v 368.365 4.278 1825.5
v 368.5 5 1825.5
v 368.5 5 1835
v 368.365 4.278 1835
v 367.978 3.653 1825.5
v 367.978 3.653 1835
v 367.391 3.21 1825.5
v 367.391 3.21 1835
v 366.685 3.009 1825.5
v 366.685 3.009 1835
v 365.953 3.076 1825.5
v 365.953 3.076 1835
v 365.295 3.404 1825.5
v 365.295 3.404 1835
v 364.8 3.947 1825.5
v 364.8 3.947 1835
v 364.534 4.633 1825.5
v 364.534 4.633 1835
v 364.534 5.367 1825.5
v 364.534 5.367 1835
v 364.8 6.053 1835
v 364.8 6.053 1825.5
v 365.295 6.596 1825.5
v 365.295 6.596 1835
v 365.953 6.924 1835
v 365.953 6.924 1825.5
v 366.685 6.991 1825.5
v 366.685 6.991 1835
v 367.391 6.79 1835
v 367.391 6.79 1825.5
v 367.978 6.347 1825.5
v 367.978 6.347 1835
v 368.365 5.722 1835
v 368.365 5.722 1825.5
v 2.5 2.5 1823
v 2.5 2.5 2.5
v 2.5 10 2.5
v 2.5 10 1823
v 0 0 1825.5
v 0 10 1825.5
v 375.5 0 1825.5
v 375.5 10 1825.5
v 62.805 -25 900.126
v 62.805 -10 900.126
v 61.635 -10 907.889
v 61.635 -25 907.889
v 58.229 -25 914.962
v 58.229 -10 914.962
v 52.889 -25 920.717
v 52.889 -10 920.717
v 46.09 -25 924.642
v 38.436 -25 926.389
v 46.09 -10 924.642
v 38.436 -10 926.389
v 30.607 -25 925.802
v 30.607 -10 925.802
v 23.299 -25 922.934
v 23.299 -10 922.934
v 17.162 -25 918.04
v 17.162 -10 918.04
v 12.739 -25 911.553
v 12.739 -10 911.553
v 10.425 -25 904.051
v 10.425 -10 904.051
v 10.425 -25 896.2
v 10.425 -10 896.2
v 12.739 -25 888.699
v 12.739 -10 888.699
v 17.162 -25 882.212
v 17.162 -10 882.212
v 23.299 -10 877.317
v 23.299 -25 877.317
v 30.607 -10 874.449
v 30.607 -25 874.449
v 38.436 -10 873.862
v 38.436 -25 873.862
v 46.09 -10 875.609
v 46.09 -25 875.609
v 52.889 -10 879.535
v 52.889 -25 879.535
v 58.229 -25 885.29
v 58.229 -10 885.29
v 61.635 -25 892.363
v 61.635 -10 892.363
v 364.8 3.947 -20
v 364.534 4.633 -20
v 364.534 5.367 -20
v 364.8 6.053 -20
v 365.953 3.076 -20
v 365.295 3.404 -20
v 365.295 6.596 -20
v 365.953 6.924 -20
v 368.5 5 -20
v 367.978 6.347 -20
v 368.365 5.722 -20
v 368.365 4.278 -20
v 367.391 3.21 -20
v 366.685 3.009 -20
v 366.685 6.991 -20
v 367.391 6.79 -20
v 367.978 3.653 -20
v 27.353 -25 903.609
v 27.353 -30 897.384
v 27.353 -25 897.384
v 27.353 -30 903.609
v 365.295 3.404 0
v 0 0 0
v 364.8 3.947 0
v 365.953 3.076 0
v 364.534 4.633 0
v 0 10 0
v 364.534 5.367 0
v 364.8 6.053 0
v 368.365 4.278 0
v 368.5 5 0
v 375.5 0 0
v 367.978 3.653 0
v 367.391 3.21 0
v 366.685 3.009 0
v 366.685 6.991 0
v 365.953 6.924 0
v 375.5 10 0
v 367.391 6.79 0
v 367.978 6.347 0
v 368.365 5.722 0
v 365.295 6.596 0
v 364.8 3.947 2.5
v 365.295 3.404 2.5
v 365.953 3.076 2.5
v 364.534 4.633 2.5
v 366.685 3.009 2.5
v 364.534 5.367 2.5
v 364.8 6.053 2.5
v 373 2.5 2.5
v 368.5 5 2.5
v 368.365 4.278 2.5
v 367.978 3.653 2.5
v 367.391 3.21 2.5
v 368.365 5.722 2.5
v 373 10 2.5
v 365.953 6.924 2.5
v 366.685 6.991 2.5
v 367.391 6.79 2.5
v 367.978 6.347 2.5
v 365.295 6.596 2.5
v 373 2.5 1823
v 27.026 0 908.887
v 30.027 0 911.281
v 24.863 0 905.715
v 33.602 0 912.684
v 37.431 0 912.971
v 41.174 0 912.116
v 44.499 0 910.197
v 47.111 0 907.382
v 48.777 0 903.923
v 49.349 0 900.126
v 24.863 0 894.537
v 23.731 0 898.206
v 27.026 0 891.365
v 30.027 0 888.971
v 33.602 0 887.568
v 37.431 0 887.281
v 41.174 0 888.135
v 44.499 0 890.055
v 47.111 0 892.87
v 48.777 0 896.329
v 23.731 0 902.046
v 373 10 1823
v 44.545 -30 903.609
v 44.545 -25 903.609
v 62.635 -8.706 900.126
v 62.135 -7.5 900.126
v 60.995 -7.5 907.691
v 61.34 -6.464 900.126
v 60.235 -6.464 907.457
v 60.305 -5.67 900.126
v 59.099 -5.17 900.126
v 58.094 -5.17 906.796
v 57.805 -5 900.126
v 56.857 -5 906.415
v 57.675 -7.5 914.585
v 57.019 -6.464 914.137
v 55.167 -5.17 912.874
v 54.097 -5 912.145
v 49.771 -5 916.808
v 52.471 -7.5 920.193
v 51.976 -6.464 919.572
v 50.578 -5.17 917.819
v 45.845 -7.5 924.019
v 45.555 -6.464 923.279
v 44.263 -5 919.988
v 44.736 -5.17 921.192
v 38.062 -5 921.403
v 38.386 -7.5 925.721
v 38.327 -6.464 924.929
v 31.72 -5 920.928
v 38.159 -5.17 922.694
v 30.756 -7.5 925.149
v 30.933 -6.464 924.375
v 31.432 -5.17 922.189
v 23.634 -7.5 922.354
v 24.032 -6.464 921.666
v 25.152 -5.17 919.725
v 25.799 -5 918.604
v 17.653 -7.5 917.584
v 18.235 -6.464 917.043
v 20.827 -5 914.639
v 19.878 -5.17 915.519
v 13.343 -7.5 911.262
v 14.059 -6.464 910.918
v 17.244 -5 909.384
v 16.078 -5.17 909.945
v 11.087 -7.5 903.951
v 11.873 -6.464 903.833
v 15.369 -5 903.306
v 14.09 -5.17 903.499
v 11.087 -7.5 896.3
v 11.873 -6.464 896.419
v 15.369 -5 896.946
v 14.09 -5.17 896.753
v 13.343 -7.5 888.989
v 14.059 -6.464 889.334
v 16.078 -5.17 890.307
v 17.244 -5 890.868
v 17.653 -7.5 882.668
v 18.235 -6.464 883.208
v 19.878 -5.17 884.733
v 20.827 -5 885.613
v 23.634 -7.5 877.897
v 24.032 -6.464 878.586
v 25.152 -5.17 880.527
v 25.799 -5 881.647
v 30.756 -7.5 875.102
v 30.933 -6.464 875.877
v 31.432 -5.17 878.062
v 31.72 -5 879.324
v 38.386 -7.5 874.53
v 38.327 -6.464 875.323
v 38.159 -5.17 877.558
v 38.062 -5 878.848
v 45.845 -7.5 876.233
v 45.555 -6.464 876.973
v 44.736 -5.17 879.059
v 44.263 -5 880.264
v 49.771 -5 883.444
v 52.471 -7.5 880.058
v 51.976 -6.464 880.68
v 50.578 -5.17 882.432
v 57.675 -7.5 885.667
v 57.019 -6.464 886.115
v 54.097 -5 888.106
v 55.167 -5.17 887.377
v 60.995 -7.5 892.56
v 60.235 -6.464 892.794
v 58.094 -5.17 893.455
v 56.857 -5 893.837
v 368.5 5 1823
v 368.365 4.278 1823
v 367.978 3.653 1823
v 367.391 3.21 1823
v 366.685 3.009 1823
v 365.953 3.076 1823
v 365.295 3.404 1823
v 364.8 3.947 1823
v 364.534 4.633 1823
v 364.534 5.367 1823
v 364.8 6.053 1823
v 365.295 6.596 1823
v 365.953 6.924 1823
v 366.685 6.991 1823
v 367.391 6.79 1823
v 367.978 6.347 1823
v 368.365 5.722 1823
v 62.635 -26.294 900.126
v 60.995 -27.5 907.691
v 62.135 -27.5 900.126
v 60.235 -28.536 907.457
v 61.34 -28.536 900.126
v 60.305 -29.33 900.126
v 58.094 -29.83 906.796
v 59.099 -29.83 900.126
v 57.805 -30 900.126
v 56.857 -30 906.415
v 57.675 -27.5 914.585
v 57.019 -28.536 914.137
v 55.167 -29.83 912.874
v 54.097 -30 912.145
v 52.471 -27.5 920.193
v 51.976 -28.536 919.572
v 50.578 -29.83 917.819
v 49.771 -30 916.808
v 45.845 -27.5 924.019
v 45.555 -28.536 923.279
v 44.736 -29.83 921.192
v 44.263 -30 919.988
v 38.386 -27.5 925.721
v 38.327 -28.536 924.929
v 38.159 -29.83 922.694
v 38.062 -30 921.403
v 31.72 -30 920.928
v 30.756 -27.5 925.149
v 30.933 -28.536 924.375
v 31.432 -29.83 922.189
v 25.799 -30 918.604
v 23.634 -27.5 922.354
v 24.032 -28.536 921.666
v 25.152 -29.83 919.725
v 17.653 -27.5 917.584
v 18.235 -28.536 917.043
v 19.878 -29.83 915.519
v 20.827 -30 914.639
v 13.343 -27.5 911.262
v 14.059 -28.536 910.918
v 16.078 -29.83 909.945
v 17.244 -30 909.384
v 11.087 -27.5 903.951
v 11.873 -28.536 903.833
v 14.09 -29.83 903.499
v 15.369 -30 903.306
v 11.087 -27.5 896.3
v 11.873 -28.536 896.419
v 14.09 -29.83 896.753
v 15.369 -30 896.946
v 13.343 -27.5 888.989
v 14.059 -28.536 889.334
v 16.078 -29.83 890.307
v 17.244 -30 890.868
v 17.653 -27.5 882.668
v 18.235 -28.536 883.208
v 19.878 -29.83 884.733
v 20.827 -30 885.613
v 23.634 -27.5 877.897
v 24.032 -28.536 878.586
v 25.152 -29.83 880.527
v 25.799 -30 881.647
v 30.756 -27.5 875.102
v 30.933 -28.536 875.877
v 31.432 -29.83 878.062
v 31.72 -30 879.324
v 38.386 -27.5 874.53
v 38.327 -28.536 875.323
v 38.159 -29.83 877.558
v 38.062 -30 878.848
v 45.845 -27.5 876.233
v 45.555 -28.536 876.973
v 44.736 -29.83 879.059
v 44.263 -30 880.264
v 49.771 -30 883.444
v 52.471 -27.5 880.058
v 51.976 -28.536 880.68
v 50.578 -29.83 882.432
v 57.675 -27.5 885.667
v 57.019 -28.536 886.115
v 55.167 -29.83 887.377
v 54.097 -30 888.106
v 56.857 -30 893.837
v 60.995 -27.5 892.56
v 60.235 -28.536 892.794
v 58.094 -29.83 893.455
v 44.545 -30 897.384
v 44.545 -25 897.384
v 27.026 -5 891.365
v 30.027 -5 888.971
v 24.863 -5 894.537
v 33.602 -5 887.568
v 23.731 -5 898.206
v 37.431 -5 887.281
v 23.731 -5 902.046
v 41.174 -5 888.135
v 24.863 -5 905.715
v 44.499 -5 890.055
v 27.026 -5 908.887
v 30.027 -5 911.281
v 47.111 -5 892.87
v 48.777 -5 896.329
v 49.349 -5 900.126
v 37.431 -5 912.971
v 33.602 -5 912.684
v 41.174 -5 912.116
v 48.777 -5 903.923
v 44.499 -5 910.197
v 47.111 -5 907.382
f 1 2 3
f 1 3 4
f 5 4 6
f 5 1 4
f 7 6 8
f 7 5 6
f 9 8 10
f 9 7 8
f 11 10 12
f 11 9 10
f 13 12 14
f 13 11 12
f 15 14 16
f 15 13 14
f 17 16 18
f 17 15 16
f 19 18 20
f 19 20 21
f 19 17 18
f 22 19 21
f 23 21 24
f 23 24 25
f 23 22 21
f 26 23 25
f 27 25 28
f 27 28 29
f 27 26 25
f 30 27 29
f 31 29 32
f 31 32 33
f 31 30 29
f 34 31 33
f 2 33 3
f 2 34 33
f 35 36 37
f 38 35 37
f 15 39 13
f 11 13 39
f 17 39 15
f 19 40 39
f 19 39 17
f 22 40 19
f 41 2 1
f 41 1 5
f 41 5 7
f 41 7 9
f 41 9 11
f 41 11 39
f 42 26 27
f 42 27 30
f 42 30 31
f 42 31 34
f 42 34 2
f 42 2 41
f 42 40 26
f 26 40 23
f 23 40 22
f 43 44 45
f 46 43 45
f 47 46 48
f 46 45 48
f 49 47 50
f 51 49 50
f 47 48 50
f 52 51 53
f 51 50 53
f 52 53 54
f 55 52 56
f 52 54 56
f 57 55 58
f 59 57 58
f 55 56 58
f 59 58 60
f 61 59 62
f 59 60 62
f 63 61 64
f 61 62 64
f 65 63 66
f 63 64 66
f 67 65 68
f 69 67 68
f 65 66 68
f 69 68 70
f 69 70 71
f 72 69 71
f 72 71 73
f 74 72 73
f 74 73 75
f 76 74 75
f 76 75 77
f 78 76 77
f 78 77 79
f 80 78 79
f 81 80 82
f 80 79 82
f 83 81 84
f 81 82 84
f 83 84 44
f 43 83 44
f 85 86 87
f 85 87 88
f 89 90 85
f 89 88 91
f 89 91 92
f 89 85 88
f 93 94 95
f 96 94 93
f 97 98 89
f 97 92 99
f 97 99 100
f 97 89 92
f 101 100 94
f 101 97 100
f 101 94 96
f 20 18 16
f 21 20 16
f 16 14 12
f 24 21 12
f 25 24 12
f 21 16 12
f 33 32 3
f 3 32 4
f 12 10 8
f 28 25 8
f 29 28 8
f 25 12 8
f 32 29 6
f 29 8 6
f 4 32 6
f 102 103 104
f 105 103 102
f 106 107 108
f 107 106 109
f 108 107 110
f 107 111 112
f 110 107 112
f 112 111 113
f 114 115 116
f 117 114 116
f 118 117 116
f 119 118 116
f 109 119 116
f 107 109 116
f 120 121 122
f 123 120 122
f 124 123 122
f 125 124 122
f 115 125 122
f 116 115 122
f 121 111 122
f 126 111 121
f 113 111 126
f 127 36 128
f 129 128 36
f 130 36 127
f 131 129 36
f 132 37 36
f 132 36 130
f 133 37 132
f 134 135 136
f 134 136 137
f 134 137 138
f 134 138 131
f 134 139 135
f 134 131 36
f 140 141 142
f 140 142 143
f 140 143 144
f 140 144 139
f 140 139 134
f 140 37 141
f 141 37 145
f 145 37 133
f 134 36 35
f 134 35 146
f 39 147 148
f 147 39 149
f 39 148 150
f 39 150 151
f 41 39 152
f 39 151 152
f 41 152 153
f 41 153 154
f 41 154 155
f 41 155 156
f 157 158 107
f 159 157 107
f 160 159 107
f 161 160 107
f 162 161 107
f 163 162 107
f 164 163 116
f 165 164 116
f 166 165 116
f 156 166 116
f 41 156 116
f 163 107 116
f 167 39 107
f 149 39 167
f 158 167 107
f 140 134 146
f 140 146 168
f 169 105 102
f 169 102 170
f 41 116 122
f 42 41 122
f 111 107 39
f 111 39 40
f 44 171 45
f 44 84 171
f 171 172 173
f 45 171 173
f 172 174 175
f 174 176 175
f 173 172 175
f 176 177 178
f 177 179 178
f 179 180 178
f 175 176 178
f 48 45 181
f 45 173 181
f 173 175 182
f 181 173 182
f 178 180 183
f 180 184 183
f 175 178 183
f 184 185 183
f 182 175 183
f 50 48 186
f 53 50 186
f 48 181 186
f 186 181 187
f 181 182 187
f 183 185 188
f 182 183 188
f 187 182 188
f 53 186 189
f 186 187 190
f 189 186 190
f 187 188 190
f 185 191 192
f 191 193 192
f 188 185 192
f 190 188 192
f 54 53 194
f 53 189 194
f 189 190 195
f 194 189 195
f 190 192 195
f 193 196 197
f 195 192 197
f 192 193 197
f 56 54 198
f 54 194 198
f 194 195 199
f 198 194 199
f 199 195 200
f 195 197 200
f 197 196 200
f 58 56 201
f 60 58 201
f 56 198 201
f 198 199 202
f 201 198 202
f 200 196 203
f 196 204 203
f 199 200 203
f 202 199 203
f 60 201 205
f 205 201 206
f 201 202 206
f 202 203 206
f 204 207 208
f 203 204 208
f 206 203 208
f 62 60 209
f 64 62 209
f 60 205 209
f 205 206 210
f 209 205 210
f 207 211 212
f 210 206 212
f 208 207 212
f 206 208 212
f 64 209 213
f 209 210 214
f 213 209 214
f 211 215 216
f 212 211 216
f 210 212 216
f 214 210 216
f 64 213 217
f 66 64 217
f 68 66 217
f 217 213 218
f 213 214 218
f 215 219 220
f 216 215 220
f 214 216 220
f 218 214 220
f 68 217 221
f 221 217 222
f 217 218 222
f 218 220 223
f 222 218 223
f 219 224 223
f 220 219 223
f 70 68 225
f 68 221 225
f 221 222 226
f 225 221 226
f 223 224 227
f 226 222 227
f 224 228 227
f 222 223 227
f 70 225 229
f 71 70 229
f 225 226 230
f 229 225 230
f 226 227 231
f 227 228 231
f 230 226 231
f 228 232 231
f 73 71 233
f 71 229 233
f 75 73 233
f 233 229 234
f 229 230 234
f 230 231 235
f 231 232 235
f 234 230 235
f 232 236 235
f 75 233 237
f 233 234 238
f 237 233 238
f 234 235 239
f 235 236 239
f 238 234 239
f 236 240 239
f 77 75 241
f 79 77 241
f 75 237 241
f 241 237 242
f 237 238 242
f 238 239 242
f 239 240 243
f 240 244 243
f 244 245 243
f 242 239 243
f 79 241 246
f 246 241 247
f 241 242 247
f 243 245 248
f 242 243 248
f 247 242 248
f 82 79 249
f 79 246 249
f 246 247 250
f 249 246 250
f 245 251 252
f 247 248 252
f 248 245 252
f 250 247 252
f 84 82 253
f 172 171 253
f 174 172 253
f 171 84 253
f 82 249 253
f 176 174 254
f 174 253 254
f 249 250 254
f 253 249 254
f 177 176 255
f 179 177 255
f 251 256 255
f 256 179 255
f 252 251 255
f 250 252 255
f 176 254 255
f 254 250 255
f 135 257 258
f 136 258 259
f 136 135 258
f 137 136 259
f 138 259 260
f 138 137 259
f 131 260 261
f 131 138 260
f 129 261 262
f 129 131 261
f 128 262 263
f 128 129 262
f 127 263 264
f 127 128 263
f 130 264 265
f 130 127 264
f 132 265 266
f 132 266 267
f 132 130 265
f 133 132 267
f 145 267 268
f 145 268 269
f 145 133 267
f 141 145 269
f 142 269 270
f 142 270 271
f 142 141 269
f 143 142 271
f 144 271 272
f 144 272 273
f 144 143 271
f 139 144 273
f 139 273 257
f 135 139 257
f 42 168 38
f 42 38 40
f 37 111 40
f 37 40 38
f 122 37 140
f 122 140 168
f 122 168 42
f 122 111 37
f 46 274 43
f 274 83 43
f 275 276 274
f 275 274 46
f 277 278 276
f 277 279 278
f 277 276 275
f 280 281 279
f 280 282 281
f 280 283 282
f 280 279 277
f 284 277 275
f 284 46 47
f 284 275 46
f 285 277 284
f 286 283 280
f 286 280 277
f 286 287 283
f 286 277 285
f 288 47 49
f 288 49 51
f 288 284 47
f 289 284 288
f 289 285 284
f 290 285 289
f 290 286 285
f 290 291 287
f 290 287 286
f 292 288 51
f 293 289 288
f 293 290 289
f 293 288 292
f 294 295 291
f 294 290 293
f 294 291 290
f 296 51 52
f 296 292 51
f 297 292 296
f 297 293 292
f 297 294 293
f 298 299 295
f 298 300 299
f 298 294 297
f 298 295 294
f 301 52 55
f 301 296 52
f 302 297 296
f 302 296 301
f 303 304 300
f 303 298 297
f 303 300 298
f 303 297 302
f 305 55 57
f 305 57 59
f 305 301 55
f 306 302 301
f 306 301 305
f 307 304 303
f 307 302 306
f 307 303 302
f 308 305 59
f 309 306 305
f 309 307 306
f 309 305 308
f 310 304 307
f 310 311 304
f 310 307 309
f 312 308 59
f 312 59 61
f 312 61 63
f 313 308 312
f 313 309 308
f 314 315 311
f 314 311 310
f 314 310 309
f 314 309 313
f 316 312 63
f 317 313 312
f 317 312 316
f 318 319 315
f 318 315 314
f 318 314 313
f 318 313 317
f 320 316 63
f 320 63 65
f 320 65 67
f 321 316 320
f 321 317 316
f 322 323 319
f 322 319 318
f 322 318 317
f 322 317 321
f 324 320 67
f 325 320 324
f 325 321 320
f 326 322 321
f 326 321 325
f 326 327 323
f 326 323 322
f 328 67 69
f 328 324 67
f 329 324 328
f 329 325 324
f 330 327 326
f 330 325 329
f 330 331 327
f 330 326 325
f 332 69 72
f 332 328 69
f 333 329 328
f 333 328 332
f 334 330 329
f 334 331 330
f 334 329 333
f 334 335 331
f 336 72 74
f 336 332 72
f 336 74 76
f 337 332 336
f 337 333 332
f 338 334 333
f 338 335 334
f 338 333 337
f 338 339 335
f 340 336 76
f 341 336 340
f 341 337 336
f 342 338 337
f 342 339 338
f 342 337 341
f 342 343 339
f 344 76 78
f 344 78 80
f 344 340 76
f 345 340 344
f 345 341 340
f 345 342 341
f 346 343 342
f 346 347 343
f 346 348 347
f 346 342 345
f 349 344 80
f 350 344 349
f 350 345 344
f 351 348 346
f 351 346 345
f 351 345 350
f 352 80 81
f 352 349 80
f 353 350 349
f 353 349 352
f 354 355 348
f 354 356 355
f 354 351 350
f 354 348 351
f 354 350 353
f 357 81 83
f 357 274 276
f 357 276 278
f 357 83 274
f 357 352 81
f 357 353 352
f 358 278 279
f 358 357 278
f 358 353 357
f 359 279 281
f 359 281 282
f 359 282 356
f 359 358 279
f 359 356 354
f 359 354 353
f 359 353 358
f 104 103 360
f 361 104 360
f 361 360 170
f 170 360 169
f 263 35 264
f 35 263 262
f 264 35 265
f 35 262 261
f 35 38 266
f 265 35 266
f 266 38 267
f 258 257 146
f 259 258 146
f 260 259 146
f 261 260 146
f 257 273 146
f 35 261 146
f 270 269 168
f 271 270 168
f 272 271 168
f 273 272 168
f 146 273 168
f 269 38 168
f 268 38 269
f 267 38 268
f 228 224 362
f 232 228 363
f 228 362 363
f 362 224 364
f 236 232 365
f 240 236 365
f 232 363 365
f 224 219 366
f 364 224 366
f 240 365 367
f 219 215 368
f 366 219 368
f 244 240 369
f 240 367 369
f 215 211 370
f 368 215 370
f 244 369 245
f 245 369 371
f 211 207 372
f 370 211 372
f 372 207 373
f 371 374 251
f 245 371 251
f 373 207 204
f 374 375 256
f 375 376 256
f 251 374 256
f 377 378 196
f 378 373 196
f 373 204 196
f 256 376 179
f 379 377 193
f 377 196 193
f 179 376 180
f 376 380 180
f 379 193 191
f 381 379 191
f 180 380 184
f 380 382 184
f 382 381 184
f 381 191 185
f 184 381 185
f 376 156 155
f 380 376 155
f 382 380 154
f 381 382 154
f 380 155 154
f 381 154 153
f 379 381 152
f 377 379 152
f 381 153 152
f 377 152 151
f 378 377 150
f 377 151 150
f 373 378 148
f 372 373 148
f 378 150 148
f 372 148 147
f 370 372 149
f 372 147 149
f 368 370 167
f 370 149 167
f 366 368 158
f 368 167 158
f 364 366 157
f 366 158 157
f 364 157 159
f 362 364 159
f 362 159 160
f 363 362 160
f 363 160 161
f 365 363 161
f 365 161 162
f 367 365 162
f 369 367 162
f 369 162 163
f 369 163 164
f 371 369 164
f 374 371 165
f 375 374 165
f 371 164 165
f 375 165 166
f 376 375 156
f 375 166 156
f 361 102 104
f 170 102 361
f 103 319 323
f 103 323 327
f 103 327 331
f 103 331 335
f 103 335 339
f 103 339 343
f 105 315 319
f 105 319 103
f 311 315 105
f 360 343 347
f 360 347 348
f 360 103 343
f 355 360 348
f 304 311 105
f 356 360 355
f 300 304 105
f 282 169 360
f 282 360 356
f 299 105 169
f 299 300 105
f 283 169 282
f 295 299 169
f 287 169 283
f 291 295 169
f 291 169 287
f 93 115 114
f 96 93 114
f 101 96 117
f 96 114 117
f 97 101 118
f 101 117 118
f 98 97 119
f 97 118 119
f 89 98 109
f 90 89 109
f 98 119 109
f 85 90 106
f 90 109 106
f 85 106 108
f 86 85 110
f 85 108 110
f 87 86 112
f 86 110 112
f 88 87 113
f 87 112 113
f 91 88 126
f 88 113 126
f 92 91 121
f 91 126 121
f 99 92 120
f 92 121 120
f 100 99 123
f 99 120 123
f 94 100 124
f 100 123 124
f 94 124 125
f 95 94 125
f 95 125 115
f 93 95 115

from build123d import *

# Parameters (mm, degrees)
F0_W          = 375.5
F0_H          = 10
F1_DEPTH      = 1825.5
F2_T          = -2.5
F3_R          = 2
F4_DEPTH      = 20
F4_DEPTH_BACK = 1835
F5_R          = 12.88095
F6_DEPTH      = 5
F7_R          = 26.336988
F8_DEPTH      = 25
F9_R          = 5
F10_W         = 17.191563
F10_H         = 6.224573
F11_DEPTH     = 5


with BuildPart() as f1:
    # F0 (on Top) → F1 (new body)
    with BuildSketch(Plane.XY):
        with Locations((187.75, 5)):
            Rectangle(F0_W, F0_H)
    extrude(amount=F1_DEPTH)

    # F2
    f2_openings = [f1.faces().sort_by_distance(p)[0] for p in [
        (187.75, 10, 912.75),
    ]]
    offset(amount=F2_T, openings=f2_openings)

    # F3 (on face) → F4 (join, two sides)
    with BuildSketch(Plane(origin=(0, 0, 0), x_dir=(1, 0, 0), z_dir=(0, 0, -1))) as f4_sk:
        with Locations((366.5, -5)):
            Circle(F3_R)
    extrude(amount=F4_DEPTH)
    extrude(f4_sk.sketch, amount=-F4_DEPTH_BACK)

    # F5 (on face) → F6 (join)
    with BuildSketch(Plane.XZ):
        with Locations((36.467917, 900.125802)):
            Circle(F5_R)
    extrude(amount=F6_DEPTH)

    # F7 (on face) → F8 (join)
    with BuildSketch(Plane.XZ.offset(5)):
        with Locations((36.467917, 900.125802)):
            Circle(F7_R)
    extrude(amount=F8_DEPTH)

    # F9
    f9_edges = [f1.edges().sort_by_distance(p)[0] for p in [
        (10.130929, -30, 900.125802),
        (10.130929, -5, 900.125802),
    ]]
    fillet(f9_edges, radius=F9_R)

    # F10 (on face) → F11 (cut)
    with BuildSketch(Plane.XZ.offset(30)):
        with Locations((35.949202, 900.496275)):
            Rectangle(F10_W, F10_H)
    extrude(amount=-F11_DEPTH, mode=Mode.SUBTRACT)


solid = f1.part
